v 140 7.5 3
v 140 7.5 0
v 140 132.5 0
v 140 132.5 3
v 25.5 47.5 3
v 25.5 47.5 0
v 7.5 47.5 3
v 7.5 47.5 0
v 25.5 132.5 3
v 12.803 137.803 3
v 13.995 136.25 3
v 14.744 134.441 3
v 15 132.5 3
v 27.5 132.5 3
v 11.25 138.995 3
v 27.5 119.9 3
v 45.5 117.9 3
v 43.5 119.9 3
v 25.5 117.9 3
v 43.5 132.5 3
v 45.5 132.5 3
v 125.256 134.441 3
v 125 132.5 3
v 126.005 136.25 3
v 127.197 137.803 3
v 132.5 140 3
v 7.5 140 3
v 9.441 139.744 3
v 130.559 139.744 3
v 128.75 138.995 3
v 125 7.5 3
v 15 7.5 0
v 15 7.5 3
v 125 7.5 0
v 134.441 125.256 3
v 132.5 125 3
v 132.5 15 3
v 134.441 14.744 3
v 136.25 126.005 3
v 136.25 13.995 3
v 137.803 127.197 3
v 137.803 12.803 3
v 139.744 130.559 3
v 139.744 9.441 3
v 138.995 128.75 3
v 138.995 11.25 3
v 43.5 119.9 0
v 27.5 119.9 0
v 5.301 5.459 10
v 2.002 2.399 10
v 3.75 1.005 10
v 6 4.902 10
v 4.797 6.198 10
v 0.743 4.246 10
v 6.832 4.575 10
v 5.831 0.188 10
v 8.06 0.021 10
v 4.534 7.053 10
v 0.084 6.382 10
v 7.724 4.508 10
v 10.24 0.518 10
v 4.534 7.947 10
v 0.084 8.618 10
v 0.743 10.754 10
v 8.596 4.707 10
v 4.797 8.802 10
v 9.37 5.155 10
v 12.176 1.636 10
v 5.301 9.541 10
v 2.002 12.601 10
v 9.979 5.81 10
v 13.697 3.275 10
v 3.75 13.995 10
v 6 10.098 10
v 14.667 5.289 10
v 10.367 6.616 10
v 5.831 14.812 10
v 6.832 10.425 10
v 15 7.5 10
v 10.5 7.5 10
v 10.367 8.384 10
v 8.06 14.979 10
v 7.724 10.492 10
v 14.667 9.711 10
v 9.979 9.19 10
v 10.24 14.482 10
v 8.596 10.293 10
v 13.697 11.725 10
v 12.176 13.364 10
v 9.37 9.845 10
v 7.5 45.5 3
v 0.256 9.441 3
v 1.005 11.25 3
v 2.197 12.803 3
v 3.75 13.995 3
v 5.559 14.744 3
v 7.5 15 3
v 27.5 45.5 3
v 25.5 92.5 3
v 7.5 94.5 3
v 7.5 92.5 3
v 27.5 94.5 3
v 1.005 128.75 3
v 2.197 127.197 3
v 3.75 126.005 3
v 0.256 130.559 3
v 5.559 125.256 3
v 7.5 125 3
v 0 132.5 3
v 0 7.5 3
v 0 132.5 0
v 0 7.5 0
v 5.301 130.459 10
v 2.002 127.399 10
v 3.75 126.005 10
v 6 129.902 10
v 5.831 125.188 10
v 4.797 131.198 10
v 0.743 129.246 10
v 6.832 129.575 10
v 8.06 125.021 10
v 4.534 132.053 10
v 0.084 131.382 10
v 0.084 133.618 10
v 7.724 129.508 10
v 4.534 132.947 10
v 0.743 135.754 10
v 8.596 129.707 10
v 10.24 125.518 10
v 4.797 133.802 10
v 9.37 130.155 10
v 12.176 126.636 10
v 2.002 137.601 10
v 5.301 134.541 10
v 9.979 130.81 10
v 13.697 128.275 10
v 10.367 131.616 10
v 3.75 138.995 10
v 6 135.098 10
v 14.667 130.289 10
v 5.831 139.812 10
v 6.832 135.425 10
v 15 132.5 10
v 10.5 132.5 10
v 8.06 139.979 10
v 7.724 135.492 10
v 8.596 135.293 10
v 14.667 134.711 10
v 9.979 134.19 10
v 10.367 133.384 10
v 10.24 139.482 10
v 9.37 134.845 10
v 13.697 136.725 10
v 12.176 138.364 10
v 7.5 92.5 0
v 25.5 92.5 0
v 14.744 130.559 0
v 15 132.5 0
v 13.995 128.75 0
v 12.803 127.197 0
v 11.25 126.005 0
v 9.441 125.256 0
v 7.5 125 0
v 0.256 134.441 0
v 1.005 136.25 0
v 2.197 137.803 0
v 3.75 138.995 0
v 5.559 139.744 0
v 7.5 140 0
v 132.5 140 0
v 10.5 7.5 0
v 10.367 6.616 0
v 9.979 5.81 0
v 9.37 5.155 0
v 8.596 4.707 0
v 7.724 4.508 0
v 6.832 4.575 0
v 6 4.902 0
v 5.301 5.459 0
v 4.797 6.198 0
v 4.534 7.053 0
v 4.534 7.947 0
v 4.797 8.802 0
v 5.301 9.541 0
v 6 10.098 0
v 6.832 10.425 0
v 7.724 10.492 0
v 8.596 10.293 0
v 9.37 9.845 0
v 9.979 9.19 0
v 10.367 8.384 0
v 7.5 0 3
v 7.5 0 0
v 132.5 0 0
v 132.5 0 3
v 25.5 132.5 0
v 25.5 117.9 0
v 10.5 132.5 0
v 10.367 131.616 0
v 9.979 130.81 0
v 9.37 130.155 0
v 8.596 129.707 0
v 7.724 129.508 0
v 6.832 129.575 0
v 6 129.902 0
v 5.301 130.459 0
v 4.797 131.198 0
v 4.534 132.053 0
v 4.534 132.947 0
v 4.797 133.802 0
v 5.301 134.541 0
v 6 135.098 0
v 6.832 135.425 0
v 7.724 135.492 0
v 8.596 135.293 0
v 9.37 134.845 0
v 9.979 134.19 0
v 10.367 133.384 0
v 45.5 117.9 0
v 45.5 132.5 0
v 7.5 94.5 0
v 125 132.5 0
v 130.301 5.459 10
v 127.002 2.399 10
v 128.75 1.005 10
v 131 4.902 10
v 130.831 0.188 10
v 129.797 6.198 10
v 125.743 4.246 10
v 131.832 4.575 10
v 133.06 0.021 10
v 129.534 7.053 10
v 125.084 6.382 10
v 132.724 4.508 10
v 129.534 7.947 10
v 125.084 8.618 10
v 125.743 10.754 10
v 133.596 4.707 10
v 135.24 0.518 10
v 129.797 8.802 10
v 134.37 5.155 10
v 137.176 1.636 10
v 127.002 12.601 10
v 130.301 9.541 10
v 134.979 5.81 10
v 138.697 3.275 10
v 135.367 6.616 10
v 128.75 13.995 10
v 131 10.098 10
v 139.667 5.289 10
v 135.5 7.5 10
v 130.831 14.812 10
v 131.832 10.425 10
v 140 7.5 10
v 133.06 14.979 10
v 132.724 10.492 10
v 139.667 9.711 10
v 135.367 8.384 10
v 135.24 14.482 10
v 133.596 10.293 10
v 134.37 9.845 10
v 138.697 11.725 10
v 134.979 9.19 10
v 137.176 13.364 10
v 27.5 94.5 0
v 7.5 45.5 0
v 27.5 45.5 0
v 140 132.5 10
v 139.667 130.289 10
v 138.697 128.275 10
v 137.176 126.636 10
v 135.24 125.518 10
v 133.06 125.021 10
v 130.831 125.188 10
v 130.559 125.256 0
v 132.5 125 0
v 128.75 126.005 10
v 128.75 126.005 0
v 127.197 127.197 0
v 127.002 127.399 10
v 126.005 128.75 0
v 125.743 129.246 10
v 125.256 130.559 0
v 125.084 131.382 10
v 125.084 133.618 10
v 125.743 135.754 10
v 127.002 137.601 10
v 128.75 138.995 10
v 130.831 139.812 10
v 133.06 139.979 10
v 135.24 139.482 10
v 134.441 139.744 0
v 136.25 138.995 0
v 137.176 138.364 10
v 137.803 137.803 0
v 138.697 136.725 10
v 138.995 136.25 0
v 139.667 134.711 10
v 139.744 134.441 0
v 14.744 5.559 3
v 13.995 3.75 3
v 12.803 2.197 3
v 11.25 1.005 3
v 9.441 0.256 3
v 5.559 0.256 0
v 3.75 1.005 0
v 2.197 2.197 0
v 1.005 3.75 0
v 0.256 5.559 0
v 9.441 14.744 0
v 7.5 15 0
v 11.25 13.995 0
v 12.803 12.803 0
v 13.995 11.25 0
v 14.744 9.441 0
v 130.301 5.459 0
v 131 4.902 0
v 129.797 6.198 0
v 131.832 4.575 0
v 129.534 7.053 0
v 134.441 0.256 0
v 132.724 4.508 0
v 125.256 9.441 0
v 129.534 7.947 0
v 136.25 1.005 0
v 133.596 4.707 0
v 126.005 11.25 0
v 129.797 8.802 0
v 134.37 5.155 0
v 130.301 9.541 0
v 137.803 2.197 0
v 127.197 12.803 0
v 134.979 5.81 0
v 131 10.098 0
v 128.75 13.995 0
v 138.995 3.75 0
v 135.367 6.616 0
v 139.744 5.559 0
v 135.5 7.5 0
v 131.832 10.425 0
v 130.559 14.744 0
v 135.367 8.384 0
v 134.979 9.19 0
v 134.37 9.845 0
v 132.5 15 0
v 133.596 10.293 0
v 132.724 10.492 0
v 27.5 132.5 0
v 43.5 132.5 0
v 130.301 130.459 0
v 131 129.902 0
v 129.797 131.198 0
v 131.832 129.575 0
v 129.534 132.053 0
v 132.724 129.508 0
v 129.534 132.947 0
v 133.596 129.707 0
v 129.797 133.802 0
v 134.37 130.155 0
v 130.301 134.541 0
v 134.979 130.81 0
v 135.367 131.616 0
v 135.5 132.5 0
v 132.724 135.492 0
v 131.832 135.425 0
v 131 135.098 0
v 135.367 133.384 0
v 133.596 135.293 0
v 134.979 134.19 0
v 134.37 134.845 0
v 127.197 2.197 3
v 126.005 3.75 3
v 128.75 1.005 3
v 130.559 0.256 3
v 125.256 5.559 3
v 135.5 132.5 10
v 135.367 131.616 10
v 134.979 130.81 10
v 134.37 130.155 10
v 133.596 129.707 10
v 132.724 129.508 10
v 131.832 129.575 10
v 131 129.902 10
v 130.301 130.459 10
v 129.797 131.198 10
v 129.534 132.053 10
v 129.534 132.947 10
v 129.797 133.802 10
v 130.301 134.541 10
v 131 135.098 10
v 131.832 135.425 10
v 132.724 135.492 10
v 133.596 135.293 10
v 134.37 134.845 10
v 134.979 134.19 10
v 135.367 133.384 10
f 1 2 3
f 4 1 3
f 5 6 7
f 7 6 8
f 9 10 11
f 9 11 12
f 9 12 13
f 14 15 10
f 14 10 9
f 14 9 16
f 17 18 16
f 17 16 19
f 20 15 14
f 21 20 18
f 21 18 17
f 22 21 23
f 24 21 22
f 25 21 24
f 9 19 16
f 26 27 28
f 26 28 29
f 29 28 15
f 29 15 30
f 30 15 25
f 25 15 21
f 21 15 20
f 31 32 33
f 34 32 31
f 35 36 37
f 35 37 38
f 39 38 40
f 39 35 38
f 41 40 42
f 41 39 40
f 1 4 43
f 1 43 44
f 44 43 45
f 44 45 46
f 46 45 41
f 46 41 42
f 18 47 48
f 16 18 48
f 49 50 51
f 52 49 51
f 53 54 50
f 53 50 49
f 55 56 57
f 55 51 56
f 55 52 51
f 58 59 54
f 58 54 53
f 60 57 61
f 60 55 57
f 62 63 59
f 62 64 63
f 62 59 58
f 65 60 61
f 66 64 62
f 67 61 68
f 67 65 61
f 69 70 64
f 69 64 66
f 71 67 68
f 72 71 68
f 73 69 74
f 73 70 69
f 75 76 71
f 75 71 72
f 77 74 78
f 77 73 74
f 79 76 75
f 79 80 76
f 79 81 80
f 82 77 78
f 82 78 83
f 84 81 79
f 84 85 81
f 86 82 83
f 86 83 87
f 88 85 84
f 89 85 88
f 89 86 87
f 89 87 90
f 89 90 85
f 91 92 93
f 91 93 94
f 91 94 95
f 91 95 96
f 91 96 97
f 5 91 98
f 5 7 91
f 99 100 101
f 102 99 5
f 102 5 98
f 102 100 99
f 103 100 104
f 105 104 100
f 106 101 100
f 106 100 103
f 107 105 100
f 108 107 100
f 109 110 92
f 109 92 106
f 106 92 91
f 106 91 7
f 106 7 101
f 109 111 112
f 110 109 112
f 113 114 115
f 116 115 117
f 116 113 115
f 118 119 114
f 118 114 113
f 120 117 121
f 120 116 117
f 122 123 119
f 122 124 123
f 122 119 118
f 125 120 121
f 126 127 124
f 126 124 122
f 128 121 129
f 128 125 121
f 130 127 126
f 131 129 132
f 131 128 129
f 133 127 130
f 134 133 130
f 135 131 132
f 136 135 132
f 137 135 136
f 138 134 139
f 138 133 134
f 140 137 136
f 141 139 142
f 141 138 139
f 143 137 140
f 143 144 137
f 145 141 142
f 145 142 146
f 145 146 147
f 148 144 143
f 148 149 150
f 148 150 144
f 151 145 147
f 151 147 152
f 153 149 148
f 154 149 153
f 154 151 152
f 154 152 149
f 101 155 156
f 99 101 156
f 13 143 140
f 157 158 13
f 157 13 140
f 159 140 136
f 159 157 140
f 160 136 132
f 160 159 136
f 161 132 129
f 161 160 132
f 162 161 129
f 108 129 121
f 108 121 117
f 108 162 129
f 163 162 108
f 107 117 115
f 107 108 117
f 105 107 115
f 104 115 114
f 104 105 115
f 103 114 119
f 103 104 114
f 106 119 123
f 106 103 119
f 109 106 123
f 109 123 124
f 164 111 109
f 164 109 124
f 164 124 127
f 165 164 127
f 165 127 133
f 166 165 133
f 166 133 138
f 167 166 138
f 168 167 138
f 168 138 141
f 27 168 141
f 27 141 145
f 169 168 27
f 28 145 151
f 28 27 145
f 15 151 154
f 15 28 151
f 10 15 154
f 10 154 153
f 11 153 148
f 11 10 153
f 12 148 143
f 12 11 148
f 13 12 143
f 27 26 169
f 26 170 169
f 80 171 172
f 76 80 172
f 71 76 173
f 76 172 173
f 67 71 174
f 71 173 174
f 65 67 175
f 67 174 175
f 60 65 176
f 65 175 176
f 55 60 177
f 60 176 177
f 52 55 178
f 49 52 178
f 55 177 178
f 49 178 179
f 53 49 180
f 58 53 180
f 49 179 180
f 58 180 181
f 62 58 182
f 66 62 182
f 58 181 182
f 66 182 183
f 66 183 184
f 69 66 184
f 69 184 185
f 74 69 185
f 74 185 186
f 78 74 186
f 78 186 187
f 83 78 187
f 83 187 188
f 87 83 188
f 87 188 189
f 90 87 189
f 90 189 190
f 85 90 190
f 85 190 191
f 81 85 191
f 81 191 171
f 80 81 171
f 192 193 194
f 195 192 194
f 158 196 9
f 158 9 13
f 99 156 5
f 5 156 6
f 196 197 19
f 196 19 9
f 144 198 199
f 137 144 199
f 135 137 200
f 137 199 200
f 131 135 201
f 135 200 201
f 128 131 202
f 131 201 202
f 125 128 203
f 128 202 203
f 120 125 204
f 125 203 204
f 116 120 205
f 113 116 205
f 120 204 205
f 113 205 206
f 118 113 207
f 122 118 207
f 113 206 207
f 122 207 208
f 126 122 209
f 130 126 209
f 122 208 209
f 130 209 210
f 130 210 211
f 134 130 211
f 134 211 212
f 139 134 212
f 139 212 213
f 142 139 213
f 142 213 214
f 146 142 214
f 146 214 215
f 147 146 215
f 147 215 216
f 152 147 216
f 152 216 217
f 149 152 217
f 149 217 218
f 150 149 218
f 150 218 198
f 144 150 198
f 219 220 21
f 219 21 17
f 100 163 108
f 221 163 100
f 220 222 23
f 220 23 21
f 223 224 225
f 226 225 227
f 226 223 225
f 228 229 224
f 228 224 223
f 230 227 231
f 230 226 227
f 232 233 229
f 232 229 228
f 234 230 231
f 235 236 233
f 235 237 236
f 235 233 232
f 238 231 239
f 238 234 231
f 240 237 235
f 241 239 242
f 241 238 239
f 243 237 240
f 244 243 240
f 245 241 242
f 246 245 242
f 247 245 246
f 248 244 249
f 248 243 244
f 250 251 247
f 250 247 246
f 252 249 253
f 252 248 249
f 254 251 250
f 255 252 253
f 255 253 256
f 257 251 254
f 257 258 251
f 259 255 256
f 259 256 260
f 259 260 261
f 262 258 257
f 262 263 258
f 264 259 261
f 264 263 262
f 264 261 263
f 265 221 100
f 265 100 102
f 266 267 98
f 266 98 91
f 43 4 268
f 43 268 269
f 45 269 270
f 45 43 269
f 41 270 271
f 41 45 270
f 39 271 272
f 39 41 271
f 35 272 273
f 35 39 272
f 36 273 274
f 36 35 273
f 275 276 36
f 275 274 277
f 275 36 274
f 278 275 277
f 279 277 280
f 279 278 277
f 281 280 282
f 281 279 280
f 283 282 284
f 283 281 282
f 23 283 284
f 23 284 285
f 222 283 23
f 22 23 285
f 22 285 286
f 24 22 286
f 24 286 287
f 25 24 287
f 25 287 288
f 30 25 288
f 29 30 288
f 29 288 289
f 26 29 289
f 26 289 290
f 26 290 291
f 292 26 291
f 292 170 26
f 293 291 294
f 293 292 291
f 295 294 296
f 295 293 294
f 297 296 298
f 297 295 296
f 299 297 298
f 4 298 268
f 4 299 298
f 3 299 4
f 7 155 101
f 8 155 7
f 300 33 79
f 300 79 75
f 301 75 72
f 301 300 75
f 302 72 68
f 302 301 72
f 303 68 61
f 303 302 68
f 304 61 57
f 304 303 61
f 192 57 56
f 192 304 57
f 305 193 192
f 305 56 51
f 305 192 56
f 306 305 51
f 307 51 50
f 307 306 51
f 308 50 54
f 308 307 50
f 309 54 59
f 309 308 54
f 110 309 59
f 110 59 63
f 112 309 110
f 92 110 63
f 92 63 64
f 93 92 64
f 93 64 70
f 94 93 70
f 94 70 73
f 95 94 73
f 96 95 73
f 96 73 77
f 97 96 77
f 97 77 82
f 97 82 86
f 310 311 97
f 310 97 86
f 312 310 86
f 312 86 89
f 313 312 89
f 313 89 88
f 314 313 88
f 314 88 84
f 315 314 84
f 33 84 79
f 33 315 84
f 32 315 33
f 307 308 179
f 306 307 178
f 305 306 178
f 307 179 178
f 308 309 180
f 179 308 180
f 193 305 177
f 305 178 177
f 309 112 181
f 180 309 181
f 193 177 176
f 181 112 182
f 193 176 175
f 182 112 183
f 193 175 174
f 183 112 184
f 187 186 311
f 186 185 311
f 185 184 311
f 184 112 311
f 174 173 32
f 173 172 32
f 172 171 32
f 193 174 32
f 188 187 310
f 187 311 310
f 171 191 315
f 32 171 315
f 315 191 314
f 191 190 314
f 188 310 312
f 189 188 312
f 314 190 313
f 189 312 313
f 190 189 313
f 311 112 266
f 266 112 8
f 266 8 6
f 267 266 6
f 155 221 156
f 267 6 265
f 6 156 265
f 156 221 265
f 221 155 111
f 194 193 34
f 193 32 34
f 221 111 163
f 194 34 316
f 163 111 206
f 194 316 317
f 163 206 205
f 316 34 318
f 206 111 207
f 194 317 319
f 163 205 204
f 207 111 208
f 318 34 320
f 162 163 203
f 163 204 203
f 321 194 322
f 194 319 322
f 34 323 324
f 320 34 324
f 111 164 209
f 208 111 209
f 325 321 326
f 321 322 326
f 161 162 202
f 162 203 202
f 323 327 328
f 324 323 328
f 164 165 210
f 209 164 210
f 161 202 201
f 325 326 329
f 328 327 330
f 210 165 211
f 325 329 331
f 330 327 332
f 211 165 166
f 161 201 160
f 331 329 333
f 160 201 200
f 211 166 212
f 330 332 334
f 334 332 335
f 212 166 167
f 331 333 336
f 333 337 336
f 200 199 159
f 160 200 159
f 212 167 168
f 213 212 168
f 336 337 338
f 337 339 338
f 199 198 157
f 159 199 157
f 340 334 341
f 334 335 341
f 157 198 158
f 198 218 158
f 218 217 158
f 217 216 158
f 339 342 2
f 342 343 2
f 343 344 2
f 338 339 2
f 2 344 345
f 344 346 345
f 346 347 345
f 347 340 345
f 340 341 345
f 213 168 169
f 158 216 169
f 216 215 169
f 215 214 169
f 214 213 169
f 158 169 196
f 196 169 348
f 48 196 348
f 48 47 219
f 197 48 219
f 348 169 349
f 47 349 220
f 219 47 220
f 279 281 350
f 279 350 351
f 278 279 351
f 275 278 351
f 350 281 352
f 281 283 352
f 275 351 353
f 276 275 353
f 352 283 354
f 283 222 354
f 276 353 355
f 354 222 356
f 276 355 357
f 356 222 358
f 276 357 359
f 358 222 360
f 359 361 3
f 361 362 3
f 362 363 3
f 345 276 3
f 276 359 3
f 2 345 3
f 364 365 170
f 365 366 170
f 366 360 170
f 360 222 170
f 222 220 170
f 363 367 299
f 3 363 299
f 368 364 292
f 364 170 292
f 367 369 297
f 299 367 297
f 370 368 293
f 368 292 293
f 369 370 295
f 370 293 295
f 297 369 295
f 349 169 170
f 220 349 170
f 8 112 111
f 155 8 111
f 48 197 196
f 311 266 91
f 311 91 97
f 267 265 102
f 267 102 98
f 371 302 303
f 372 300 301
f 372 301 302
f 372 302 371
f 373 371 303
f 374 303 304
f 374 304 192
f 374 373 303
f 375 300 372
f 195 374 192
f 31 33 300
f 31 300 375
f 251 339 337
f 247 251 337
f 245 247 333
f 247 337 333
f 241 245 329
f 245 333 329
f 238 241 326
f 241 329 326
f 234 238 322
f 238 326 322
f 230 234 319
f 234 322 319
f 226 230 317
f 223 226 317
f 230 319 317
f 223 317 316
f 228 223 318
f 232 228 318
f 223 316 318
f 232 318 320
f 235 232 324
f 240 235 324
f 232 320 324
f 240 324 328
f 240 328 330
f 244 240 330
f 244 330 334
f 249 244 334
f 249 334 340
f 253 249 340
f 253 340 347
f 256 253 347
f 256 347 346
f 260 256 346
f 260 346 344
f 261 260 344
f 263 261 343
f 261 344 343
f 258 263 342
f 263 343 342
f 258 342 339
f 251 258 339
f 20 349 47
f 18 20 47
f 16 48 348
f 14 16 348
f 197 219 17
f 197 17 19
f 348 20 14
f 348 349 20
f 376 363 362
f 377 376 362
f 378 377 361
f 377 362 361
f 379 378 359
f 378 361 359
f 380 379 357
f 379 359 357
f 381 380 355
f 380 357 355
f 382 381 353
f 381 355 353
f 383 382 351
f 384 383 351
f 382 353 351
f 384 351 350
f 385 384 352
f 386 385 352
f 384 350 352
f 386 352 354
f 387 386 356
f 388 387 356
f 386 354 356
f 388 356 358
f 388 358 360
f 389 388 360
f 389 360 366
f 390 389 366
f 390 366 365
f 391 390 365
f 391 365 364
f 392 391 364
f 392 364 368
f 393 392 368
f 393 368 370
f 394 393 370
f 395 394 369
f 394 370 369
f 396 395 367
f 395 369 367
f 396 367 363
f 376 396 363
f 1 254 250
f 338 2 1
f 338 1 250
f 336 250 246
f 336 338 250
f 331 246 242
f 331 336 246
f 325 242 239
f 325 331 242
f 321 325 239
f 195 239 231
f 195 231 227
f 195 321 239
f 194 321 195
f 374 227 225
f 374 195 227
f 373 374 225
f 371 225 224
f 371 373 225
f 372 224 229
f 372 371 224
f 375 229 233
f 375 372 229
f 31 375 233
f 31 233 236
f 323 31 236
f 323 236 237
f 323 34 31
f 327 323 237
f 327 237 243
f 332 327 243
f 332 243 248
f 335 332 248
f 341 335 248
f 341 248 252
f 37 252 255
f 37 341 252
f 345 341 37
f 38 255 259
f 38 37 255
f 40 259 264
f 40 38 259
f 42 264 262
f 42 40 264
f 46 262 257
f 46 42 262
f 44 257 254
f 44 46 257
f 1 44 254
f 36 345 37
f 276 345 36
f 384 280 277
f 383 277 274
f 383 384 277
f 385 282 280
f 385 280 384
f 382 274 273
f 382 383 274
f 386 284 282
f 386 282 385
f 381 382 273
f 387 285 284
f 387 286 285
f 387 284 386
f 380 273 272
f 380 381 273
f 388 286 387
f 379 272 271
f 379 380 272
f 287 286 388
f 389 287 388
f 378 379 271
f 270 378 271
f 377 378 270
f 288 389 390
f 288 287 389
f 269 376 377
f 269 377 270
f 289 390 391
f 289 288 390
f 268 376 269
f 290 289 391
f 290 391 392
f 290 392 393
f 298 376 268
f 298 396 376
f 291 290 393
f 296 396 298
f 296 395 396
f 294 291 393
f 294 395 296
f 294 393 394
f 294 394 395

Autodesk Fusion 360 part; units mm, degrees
sketch "Sketch1" plane through (0, 0, 0) normal (0, 0, 1) x (1, 0, 0)
  line L0 (7.5, 0) -> (132.5, 0)
  line L1 (140, 7.5) -> (140, 132.5)
  line L2 (132.5, 140) -> (7.5, 140)
  line L3 (0, 132.5) -> (0, 7.5)
  circle A0 centre (7.5, 132.5) radius 7.5
  circle A1 centre (7.5, 132.5) radius 3
  line L4 (0, 70) -> (140, 70) construction
  line L5 (70, 140) -> (70, 0) construction
  circle A2 centre (7.5, 7.5) radius 3
  circle A3 centre (7.5, 7.5) radius 7.5
  circle A4 centre (132.5, 132.5) radius 7.5
  circle A5 centre (132.5, 132.5) radius 3
  circle A6 centre (132.5, 7.5) radius 3
  circle A7 centre (132.5, 7.5) radius 7.5
  line L6 (7.5, 7.5) -> (132.5, 7.5)
  line L7 (132.5, 7.5) -> (132.5, 132.5)
  line L8 (132.5, 132.5) -> (7.5, 132.5)
  line L9 (7.5, 132.5) -> (7.5, 7.5)
  line L10 (7.5, 92.5) -> (25.5, 92.5)
  line L11 (25.5, 92.5) -> (25.5, 47.5)
  line L12 (25.5, 47.5) -> (7.5, 47.5)
  line L13 (7.5, 47.5) -> (7.5, 92.5)
  line L14 (7.5, 70) -> (25.5, 70) construction
  line L15 (7.5, 94.5) -> (27.5, 94.5)
  line L16 (27.5, 94.5) -> (27.5, 45.5)
  line L17 (27.5, 45.5) -> (7.5, 45.5)
  line L18 (7.5, 45.5) -> (7.5, 94.5)
  line L19 (7.5, 70) -> (27.5, 70) construction
  line L20 (27.5, 132.5) -> (43.5, 132.5)
  line L21 (43.5, 132.5) -> (43.5, 119.9)
  line L22 (43.5, 119.9) -> (27.5, 119.9)
  line L23 (27.5, 119.9) -> (27.5, 132.5)
  line L24 (25.5, 132.5) -> (45.5, 132.5)
  line L25 (45.5, 132.5) -> (45.5, 117.9)
  line L26 (45.5, 117.9) -> (25.5, 117.9)
  line L27 (25.5, 117.9) -> (25.5, 132.5)
  line L28 (35.5, 119.9) -> (35.5, 122) construction
  line L29 (35.5, 117.9) -> (35.5, 122) construction
  dimension "d3" = 15
  dimension "d4" = 6
  dimension "d6" = 140
  dimension "d7" = 140
  dimension "d10" = 45
  dimension "d11" = 18
  dimension "d12" = 49
  dimension "d13" = 20
  dimension "d14" = 16
  dimension "d15" = 12.6
  dimension "d16" = 20
  dimension "d17" = 20
  dimension "d18" = 14.6
extrude "Extrude1" add sketch "Sketch1" along normal blind 10 contours A2 A3 L6 L9 | A6 A7 L6 L7 | A2 A3 L6 L9 | A6 A7 L6 L7 | A0 A1 L8 L9 | A4 A5 L7 L8 | A0 A1 L8 L9 | A4 A5 L7 L8 makes body 1 at (14.9627, 8.2468, 3.3333) makes body 2 at (139.9627, 8.2468, 6.6667) makes body 3 at (14.8513, 133.9861, 6.6667) makes body 4 at (139.4111, 135.4133, 6.6667)
extrude "Extrude1'" add sketch "Sketch1" along normal blind 3 separate body contours L0 A3 A7 L6 | A2 A3 L6 L9 | A6 A7 L6 L7 | L3 A0 A3 L9 L13 L18 | A2 A3 L6 L9 | L1 A4 A7 L7 | A6 A7 L6 L7 | A0 A1 L8 L9 | A4 A5 L7 L8 | L2 A0 A4 L8 L20 L24 | A0 A1 L8 L9 | L9 L10 L11 L12 L15 L16 L17 L18 | A4 A5 L7 L8 | L8 L21 L22 L23 L24 L25 L26 L27 makes body 5 in component "Component"
combine "Combine1" operation add target body 4 tool bodies 5
combine "Combine2" operation add target body 2 tool bodies 4
combine "Combine3" operation add target body 1 tool bodies 2
combine "Combine4" operation add target body 3 tool bodies 1
component "Component" placed x (1, 0, 0) y (0, 1, 0) z (0, 0, 1) at (0, 0, 0)
equation "d2 = d1"
equation "d18 = d15 + 2 mm"
